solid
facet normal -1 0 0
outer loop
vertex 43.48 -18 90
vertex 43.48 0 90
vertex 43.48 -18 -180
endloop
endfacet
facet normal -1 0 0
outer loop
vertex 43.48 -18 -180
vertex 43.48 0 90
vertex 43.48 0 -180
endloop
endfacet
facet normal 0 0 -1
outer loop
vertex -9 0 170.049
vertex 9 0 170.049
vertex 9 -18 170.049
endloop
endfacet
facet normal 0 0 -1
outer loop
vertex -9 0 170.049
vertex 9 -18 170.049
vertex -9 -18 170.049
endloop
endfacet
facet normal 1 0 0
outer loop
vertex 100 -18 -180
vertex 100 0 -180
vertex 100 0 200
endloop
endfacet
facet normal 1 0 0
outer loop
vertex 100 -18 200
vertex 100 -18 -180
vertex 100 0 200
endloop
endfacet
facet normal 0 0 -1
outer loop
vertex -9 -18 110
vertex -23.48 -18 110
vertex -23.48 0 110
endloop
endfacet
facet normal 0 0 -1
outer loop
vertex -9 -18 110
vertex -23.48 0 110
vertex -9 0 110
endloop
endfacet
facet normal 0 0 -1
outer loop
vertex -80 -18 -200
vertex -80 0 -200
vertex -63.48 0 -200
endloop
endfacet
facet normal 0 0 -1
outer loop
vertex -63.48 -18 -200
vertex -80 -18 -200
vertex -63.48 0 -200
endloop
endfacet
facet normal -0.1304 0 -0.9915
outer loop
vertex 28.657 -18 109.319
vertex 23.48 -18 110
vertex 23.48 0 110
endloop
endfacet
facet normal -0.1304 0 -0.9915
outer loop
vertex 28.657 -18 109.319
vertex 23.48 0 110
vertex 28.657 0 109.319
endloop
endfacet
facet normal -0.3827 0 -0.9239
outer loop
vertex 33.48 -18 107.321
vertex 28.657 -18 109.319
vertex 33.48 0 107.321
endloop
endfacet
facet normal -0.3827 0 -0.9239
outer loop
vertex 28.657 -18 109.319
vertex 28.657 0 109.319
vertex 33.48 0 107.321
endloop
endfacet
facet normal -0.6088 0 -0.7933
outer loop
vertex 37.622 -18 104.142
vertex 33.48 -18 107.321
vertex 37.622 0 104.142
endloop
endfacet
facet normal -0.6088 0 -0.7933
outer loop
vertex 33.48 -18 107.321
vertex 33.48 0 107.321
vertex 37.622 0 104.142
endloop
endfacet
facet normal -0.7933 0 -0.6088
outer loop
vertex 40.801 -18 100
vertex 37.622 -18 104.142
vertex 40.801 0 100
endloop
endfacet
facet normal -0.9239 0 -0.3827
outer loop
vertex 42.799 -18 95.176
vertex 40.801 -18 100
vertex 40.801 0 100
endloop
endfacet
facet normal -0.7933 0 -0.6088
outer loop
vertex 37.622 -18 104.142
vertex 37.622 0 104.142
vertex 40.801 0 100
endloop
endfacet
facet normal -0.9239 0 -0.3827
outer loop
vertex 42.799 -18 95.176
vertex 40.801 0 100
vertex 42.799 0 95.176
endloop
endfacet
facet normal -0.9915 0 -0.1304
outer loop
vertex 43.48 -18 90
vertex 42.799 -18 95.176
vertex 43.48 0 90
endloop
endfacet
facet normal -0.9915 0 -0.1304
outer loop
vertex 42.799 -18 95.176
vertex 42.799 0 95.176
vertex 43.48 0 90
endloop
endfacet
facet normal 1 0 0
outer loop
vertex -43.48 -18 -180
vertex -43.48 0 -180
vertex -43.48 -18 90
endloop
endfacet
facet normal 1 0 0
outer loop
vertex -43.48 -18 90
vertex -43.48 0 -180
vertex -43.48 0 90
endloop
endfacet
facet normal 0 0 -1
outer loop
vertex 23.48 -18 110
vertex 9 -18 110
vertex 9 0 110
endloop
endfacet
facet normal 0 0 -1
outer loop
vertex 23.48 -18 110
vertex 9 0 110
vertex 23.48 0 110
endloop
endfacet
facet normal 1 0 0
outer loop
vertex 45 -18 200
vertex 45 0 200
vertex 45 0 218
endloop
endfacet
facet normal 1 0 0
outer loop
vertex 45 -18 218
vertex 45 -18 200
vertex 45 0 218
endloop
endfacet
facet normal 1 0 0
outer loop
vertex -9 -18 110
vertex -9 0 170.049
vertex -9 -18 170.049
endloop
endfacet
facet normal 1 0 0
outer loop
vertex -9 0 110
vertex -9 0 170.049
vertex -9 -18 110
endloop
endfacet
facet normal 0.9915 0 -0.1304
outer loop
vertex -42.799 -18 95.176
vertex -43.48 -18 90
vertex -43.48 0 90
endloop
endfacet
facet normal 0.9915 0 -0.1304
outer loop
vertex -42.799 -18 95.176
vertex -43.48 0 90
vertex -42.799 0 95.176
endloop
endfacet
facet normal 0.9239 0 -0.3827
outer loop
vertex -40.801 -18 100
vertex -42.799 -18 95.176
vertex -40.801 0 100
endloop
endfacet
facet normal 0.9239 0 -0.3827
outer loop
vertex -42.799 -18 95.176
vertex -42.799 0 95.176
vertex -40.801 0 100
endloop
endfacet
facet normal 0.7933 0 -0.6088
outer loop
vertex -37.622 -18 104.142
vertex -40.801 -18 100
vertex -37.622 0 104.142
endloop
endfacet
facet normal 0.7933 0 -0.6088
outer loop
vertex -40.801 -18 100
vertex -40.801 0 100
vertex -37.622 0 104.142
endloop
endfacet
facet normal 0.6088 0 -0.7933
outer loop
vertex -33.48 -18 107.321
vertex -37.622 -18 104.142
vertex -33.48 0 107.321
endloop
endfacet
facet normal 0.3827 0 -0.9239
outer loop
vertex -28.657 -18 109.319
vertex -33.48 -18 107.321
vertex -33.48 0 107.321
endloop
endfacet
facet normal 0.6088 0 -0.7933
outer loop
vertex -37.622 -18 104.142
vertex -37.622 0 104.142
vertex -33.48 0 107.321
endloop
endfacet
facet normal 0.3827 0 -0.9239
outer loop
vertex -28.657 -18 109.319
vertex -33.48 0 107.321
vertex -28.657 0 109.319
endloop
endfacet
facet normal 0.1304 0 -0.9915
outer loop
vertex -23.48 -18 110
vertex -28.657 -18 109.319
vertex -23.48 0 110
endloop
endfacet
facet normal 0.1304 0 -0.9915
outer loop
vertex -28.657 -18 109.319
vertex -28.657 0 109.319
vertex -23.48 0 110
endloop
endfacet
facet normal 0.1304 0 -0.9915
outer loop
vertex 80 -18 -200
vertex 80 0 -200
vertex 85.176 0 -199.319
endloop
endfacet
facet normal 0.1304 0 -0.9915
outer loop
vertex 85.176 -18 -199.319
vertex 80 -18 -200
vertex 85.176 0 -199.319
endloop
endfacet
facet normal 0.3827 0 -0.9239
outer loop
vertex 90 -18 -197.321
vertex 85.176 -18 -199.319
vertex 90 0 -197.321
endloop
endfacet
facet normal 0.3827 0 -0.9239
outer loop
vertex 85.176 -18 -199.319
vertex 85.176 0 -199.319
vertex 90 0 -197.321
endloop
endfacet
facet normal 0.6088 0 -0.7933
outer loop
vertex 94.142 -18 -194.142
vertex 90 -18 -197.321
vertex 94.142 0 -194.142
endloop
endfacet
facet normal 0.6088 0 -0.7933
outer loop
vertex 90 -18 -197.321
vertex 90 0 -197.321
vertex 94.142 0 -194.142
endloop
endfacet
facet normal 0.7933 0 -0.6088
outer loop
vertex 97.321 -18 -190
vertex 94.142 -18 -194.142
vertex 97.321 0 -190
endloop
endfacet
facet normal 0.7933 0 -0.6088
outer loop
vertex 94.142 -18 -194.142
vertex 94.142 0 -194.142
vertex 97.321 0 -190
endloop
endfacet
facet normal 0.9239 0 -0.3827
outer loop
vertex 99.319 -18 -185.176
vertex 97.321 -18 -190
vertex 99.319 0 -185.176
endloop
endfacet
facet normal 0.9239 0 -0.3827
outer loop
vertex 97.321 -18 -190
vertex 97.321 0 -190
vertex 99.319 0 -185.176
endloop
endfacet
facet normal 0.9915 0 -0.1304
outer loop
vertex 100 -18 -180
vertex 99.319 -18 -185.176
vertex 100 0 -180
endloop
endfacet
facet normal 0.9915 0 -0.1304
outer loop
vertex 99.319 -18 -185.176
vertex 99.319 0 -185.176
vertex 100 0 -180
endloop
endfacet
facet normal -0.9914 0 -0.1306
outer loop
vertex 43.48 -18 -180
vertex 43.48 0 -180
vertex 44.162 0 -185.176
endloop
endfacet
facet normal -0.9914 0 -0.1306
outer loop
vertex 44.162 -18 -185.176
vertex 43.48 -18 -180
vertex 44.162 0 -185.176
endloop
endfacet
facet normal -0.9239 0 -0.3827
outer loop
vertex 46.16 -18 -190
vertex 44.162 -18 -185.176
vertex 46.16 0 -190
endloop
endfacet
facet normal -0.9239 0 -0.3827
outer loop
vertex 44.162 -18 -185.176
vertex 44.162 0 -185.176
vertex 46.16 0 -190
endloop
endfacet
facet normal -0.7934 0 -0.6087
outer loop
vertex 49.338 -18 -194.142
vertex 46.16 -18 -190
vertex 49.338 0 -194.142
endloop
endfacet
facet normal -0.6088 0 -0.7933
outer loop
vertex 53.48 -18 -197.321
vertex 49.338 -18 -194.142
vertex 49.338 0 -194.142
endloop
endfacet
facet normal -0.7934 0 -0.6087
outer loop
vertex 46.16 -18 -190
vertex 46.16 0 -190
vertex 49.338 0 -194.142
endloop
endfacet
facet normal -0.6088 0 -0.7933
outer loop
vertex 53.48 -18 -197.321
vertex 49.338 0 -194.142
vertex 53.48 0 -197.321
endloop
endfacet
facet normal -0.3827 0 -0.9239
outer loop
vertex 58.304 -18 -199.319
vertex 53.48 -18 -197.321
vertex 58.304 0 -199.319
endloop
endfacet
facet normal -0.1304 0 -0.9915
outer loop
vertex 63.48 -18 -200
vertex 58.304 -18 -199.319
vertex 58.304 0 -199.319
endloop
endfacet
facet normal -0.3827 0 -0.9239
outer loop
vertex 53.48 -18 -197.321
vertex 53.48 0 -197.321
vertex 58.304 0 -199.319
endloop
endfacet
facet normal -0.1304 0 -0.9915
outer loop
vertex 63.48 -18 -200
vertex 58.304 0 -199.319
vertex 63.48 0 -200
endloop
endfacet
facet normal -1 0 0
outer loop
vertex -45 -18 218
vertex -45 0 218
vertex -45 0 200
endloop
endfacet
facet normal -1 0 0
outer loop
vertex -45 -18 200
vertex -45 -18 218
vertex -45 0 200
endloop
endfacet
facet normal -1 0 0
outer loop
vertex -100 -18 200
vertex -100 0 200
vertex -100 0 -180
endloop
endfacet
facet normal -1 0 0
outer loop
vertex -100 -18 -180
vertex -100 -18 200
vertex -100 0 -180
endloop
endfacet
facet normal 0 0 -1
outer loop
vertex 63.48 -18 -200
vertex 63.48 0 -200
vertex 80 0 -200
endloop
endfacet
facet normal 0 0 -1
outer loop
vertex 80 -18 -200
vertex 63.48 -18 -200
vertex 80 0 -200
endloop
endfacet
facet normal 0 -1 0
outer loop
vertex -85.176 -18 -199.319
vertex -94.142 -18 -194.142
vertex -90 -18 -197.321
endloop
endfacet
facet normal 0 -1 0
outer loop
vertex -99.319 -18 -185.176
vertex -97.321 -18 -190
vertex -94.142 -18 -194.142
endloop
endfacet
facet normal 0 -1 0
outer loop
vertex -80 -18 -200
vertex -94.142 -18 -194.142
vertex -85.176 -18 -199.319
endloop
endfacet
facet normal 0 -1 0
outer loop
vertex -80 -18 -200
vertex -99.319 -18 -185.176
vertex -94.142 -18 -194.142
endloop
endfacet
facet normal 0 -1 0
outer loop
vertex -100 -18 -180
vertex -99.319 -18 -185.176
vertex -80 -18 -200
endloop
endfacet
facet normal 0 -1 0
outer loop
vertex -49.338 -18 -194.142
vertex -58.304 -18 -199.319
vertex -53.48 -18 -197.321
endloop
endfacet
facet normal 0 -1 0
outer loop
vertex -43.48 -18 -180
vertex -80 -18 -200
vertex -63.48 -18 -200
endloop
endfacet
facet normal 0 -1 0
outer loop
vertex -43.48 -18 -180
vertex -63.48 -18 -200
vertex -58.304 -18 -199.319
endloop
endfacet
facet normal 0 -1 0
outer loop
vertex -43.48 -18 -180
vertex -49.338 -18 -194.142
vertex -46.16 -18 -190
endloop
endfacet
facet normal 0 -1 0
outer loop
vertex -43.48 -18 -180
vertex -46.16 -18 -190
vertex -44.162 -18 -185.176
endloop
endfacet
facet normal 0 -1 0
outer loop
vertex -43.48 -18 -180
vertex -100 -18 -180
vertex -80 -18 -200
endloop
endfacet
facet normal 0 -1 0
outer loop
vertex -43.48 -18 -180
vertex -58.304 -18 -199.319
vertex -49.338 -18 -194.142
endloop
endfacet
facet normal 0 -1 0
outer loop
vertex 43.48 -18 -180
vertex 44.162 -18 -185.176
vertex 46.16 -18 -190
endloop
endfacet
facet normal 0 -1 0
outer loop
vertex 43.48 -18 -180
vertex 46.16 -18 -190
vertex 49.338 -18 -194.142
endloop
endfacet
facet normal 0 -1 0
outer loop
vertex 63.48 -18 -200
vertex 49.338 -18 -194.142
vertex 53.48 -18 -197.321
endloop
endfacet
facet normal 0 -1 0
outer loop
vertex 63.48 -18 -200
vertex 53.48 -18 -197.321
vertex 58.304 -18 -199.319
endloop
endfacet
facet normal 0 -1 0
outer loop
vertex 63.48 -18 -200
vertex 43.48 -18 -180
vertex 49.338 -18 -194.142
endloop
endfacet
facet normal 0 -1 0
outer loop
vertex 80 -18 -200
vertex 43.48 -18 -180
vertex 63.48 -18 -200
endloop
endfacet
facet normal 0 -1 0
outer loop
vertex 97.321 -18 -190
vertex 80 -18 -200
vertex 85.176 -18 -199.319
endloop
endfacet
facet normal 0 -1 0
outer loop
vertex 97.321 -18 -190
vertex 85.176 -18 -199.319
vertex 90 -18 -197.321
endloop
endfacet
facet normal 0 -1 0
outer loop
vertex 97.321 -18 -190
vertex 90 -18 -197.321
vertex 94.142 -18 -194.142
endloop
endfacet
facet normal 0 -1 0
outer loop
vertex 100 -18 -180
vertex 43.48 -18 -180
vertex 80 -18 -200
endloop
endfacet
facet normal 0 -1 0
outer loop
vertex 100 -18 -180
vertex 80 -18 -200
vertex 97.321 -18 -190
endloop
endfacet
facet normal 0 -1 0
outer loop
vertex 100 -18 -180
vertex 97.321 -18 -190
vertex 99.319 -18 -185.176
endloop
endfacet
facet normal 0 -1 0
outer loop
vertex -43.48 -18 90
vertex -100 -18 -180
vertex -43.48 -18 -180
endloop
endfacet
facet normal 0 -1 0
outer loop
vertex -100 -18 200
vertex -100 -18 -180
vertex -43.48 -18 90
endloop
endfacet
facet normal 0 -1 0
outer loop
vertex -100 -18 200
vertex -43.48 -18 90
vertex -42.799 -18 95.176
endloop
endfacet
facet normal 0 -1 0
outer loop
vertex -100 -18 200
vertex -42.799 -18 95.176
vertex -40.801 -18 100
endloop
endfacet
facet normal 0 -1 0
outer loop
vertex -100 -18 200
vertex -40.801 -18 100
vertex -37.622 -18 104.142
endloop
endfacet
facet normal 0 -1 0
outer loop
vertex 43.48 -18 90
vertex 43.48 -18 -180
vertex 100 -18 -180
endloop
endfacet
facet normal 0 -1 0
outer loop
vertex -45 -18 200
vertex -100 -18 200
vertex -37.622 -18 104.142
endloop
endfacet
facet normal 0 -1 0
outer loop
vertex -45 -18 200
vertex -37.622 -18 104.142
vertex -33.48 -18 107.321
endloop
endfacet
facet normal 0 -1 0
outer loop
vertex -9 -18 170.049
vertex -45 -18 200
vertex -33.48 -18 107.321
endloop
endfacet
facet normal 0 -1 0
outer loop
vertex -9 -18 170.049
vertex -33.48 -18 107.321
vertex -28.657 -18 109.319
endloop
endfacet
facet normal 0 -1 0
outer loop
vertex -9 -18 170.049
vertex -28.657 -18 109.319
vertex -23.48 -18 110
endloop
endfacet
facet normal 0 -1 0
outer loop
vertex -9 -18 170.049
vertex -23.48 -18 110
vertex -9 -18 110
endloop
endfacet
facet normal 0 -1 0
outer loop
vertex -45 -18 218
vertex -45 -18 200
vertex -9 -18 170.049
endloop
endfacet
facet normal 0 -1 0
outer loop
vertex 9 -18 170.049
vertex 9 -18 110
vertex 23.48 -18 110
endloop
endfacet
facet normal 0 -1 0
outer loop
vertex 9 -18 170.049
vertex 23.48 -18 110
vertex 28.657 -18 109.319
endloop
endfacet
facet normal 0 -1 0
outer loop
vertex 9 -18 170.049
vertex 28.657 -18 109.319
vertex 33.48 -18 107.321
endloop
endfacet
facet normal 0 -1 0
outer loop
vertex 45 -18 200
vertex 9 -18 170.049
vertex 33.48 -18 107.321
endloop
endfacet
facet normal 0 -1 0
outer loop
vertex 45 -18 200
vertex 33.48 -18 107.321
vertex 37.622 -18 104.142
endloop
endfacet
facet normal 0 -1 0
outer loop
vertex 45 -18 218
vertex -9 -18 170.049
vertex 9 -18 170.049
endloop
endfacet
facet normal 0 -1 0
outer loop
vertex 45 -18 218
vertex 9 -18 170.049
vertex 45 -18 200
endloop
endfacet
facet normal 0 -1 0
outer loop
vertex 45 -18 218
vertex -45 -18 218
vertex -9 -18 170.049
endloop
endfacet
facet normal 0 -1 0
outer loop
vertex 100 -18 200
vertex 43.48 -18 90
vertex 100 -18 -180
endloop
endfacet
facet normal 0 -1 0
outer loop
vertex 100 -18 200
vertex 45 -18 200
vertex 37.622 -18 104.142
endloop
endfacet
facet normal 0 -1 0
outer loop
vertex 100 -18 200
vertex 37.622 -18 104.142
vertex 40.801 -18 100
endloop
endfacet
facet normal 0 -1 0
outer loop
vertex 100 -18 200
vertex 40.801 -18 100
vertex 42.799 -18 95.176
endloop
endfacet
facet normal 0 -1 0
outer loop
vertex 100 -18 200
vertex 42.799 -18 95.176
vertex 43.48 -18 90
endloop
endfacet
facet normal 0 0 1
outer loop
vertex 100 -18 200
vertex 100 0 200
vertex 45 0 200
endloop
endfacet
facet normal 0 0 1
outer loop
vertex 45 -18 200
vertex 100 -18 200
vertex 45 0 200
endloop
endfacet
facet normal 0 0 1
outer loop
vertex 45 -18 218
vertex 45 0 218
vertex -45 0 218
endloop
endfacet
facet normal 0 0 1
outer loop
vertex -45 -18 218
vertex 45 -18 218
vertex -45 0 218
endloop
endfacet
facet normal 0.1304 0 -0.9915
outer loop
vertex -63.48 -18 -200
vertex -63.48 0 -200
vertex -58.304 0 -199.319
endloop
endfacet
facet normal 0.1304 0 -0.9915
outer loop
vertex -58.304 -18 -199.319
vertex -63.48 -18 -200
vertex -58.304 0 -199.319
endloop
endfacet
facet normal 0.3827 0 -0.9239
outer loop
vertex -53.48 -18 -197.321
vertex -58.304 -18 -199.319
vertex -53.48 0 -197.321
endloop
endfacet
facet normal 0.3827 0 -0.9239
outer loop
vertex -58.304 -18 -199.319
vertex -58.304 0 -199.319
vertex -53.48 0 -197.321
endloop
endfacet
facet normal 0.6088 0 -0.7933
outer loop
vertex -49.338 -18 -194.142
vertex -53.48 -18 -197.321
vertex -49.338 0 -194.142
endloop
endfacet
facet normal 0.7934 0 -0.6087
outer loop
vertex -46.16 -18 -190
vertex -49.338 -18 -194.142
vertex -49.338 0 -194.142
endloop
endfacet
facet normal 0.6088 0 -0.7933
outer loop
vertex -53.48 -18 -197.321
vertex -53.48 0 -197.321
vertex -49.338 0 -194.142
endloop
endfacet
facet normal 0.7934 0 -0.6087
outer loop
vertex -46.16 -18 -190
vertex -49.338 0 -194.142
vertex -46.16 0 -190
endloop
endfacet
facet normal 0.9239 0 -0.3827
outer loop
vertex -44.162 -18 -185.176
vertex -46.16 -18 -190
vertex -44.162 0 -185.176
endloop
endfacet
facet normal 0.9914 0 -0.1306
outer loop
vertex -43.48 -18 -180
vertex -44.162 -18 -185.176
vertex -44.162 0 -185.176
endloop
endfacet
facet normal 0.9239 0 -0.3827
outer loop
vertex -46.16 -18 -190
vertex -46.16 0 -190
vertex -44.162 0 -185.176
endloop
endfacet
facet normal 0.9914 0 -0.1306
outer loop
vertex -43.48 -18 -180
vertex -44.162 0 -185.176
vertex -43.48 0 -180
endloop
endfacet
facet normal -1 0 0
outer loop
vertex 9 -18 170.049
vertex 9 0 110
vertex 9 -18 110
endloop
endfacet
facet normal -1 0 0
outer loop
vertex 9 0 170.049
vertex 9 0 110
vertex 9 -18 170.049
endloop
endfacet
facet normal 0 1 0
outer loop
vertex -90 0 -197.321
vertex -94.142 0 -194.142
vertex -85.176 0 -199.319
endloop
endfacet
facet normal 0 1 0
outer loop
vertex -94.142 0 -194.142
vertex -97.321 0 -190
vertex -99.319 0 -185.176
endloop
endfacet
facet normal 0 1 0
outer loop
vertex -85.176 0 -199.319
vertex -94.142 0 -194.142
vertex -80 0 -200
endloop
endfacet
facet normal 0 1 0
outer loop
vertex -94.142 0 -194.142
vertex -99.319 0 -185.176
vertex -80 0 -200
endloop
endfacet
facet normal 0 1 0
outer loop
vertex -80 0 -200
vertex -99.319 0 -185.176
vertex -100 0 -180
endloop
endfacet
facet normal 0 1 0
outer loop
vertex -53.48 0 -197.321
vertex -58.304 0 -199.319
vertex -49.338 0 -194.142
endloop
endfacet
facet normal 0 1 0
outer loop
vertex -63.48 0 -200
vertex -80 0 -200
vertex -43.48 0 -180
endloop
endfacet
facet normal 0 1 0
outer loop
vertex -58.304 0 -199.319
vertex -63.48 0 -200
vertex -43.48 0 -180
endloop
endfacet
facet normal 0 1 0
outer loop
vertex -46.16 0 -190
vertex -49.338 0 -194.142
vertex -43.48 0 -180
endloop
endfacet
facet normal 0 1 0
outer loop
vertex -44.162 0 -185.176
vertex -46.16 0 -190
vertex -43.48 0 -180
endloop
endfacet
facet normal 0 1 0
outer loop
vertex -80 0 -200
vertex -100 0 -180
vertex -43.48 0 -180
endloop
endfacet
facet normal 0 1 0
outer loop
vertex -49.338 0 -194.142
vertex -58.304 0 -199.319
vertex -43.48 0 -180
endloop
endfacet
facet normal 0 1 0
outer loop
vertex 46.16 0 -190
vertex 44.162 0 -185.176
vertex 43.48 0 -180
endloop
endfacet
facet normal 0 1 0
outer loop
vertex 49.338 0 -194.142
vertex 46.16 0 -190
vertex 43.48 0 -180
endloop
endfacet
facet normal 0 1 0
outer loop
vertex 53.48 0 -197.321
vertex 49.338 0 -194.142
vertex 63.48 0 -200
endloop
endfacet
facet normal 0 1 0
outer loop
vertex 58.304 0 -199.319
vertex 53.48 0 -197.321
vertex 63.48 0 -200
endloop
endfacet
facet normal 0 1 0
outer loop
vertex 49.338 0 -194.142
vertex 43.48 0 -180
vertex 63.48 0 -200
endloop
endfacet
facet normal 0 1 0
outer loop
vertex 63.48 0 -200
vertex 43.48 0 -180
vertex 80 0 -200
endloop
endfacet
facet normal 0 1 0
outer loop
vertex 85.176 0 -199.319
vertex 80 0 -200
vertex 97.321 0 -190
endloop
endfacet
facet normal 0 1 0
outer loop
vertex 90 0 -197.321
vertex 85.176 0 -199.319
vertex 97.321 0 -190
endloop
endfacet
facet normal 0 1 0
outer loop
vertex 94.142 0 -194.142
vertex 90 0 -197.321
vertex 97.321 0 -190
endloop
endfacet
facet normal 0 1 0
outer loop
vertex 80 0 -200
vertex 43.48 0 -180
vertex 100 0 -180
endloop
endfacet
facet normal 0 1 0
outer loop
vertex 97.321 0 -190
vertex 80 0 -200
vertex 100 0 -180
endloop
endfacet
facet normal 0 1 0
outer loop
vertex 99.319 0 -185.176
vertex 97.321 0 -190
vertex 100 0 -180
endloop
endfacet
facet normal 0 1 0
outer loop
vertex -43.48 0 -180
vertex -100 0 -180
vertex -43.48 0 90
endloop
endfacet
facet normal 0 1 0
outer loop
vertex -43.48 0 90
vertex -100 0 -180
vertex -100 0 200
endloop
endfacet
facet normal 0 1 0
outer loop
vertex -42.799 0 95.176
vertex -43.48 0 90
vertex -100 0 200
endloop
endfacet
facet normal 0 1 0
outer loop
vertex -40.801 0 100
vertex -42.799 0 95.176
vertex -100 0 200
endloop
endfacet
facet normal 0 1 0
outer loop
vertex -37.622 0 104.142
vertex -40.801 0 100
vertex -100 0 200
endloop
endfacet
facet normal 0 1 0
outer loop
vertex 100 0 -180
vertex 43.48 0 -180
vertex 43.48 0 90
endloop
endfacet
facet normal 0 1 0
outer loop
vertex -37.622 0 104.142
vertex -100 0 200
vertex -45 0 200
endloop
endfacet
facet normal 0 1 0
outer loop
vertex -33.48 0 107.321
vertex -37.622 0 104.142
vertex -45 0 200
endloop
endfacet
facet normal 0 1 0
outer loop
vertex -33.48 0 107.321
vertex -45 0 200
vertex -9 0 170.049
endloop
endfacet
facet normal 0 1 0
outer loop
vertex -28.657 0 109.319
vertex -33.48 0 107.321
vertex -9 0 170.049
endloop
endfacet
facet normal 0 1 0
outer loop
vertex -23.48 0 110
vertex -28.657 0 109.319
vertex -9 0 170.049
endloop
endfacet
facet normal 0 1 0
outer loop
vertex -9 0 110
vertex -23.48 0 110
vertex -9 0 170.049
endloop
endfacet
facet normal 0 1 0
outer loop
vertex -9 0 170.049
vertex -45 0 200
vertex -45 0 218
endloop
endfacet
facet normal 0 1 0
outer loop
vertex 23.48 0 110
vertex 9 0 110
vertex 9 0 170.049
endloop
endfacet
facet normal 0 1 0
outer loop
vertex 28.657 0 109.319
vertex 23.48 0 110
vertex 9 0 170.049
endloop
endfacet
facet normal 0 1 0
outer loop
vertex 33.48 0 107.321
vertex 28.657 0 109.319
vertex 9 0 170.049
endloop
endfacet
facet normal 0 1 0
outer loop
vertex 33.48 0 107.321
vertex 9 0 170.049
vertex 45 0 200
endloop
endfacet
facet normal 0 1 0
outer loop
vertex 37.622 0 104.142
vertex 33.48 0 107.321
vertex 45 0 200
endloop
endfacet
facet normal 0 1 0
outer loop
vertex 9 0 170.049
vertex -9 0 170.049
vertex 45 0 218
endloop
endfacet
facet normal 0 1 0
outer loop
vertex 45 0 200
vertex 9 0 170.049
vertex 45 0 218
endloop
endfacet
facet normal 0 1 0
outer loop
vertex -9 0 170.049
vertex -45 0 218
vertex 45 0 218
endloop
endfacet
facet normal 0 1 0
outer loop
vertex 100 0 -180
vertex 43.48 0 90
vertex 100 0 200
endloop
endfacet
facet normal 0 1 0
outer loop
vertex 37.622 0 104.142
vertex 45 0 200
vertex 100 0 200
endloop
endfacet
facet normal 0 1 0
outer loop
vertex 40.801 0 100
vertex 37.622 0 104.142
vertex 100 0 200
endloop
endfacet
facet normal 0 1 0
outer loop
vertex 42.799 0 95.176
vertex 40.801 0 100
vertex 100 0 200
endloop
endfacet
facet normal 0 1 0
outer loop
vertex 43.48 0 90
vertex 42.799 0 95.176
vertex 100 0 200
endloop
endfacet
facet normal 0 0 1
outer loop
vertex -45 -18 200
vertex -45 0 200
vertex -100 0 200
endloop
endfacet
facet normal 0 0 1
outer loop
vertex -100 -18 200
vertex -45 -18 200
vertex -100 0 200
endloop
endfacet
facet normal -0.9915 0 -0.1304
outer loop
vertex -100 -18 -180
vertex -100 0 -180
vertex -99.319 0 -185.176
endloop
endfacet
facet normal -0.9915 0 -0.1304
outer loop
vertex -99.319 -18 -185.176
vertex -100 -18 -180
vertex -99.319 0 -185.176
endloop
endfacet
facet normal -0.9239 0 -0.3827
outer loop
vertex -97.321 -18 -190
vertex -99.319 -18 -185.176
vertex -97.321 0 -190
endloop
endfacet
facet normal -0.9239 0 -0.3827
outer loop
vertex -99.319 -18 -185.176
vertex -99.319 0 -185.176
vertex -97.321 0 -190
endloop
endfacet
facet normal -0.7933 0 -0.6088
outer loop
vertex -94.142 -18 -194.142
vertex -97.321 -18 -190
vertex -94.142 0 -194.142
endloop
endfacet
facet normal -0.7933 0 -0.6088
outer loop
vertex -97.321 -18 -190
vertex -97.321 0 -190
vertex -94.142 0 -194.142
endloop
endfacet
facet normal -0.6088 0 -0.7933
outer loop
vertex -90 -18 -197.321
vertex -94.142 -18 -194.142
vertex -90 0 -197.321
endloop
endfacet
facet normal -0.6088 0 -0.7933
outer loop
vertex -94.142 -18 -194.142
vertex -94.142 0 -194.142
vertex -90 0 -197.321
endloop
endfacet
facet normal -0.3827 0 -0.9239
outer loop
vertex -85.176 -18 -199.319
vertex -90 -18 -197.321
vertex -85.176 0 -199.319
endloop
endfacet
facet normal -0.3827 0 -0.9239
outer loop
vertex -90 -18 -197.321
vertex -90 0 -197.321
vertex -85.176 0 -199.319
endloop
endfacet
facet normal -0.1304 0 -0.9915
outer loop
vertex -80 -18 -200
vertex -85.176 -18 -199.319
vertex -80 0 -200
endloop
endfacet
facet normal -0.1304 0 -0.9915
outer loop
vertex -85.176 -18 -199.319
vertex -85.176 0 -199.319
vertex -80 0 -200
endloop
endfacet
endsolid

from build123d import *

# Parameters (mm, degrees)
F2_DEPTH = 18
F3_DEPTH = 188


with BuildPart() as f2:
    # F0 (on Front) → F2 (new body)
    with BuildSketch(Plane.XZ):
        with BuildLine():
            Line((63.480214, -200), (80, -200))
            ThreePointArc((80, -200), (94.142136, -194.142136), (100, -180))
            Line((100, -180), (100, 200))
            Line((100, 200), (45, 200))
            Line((45, 200), (45, 218))
            Line((45, 218), (-45, 218))
            Line((-45, 218), (-45, 200))
            Line((-45, 200), (-100, 200))
            Line((-100, 200), (-100, -180))
            ThreePointArc((-100, -180), (-94.142136, -194.142136), (-80, -200))
            Line((-80, -200), (-63.480214, -200))
            ThreePointArc((-63.480214, -200), (-49.338079, -194.142136), (-43.480214, -180))
            Line((-43.480214, -180), (-43.480214, -110))
            Line((-43.480214, -110), (-43.480214, 90))
            ThreePointArc((-43.480214, 90), (-37.62235, 104.142136), (-23.480214, 110))
            Line((-23.480214, 110), (23.480214, 110))
            ThreePointArc((23.480214, 110), (37.62235, 104.142136), (43.480214, 90))
            Line((43.480214, 90), (43.480214, -110))
            Line((43.480214, -110), (43.480214, -180))
            ThreePointArc((43.480214, -180), (49.338079, -194.142136), (63.480214, -200))
        make_face()
    extrude(amount=F2_DEPTH)

    # F1 (on face) → F3 (cut)
    with BuildSketch(Plane.XZ):
        Polygon((9, 170.049076), (-9, 170.049076), (-9, 110.049076), (0, 110.049076), (9, 110.049076), align=None)
        Polygon((0, 110.049076), (-9, 110.049076), (-9, 70.049076), (9, 70.049076), (9, 110.049076), align=None)
    extrude(amount=F3_DEPTH, mode=Mode.SUBTRACT)


solid = f2.part
